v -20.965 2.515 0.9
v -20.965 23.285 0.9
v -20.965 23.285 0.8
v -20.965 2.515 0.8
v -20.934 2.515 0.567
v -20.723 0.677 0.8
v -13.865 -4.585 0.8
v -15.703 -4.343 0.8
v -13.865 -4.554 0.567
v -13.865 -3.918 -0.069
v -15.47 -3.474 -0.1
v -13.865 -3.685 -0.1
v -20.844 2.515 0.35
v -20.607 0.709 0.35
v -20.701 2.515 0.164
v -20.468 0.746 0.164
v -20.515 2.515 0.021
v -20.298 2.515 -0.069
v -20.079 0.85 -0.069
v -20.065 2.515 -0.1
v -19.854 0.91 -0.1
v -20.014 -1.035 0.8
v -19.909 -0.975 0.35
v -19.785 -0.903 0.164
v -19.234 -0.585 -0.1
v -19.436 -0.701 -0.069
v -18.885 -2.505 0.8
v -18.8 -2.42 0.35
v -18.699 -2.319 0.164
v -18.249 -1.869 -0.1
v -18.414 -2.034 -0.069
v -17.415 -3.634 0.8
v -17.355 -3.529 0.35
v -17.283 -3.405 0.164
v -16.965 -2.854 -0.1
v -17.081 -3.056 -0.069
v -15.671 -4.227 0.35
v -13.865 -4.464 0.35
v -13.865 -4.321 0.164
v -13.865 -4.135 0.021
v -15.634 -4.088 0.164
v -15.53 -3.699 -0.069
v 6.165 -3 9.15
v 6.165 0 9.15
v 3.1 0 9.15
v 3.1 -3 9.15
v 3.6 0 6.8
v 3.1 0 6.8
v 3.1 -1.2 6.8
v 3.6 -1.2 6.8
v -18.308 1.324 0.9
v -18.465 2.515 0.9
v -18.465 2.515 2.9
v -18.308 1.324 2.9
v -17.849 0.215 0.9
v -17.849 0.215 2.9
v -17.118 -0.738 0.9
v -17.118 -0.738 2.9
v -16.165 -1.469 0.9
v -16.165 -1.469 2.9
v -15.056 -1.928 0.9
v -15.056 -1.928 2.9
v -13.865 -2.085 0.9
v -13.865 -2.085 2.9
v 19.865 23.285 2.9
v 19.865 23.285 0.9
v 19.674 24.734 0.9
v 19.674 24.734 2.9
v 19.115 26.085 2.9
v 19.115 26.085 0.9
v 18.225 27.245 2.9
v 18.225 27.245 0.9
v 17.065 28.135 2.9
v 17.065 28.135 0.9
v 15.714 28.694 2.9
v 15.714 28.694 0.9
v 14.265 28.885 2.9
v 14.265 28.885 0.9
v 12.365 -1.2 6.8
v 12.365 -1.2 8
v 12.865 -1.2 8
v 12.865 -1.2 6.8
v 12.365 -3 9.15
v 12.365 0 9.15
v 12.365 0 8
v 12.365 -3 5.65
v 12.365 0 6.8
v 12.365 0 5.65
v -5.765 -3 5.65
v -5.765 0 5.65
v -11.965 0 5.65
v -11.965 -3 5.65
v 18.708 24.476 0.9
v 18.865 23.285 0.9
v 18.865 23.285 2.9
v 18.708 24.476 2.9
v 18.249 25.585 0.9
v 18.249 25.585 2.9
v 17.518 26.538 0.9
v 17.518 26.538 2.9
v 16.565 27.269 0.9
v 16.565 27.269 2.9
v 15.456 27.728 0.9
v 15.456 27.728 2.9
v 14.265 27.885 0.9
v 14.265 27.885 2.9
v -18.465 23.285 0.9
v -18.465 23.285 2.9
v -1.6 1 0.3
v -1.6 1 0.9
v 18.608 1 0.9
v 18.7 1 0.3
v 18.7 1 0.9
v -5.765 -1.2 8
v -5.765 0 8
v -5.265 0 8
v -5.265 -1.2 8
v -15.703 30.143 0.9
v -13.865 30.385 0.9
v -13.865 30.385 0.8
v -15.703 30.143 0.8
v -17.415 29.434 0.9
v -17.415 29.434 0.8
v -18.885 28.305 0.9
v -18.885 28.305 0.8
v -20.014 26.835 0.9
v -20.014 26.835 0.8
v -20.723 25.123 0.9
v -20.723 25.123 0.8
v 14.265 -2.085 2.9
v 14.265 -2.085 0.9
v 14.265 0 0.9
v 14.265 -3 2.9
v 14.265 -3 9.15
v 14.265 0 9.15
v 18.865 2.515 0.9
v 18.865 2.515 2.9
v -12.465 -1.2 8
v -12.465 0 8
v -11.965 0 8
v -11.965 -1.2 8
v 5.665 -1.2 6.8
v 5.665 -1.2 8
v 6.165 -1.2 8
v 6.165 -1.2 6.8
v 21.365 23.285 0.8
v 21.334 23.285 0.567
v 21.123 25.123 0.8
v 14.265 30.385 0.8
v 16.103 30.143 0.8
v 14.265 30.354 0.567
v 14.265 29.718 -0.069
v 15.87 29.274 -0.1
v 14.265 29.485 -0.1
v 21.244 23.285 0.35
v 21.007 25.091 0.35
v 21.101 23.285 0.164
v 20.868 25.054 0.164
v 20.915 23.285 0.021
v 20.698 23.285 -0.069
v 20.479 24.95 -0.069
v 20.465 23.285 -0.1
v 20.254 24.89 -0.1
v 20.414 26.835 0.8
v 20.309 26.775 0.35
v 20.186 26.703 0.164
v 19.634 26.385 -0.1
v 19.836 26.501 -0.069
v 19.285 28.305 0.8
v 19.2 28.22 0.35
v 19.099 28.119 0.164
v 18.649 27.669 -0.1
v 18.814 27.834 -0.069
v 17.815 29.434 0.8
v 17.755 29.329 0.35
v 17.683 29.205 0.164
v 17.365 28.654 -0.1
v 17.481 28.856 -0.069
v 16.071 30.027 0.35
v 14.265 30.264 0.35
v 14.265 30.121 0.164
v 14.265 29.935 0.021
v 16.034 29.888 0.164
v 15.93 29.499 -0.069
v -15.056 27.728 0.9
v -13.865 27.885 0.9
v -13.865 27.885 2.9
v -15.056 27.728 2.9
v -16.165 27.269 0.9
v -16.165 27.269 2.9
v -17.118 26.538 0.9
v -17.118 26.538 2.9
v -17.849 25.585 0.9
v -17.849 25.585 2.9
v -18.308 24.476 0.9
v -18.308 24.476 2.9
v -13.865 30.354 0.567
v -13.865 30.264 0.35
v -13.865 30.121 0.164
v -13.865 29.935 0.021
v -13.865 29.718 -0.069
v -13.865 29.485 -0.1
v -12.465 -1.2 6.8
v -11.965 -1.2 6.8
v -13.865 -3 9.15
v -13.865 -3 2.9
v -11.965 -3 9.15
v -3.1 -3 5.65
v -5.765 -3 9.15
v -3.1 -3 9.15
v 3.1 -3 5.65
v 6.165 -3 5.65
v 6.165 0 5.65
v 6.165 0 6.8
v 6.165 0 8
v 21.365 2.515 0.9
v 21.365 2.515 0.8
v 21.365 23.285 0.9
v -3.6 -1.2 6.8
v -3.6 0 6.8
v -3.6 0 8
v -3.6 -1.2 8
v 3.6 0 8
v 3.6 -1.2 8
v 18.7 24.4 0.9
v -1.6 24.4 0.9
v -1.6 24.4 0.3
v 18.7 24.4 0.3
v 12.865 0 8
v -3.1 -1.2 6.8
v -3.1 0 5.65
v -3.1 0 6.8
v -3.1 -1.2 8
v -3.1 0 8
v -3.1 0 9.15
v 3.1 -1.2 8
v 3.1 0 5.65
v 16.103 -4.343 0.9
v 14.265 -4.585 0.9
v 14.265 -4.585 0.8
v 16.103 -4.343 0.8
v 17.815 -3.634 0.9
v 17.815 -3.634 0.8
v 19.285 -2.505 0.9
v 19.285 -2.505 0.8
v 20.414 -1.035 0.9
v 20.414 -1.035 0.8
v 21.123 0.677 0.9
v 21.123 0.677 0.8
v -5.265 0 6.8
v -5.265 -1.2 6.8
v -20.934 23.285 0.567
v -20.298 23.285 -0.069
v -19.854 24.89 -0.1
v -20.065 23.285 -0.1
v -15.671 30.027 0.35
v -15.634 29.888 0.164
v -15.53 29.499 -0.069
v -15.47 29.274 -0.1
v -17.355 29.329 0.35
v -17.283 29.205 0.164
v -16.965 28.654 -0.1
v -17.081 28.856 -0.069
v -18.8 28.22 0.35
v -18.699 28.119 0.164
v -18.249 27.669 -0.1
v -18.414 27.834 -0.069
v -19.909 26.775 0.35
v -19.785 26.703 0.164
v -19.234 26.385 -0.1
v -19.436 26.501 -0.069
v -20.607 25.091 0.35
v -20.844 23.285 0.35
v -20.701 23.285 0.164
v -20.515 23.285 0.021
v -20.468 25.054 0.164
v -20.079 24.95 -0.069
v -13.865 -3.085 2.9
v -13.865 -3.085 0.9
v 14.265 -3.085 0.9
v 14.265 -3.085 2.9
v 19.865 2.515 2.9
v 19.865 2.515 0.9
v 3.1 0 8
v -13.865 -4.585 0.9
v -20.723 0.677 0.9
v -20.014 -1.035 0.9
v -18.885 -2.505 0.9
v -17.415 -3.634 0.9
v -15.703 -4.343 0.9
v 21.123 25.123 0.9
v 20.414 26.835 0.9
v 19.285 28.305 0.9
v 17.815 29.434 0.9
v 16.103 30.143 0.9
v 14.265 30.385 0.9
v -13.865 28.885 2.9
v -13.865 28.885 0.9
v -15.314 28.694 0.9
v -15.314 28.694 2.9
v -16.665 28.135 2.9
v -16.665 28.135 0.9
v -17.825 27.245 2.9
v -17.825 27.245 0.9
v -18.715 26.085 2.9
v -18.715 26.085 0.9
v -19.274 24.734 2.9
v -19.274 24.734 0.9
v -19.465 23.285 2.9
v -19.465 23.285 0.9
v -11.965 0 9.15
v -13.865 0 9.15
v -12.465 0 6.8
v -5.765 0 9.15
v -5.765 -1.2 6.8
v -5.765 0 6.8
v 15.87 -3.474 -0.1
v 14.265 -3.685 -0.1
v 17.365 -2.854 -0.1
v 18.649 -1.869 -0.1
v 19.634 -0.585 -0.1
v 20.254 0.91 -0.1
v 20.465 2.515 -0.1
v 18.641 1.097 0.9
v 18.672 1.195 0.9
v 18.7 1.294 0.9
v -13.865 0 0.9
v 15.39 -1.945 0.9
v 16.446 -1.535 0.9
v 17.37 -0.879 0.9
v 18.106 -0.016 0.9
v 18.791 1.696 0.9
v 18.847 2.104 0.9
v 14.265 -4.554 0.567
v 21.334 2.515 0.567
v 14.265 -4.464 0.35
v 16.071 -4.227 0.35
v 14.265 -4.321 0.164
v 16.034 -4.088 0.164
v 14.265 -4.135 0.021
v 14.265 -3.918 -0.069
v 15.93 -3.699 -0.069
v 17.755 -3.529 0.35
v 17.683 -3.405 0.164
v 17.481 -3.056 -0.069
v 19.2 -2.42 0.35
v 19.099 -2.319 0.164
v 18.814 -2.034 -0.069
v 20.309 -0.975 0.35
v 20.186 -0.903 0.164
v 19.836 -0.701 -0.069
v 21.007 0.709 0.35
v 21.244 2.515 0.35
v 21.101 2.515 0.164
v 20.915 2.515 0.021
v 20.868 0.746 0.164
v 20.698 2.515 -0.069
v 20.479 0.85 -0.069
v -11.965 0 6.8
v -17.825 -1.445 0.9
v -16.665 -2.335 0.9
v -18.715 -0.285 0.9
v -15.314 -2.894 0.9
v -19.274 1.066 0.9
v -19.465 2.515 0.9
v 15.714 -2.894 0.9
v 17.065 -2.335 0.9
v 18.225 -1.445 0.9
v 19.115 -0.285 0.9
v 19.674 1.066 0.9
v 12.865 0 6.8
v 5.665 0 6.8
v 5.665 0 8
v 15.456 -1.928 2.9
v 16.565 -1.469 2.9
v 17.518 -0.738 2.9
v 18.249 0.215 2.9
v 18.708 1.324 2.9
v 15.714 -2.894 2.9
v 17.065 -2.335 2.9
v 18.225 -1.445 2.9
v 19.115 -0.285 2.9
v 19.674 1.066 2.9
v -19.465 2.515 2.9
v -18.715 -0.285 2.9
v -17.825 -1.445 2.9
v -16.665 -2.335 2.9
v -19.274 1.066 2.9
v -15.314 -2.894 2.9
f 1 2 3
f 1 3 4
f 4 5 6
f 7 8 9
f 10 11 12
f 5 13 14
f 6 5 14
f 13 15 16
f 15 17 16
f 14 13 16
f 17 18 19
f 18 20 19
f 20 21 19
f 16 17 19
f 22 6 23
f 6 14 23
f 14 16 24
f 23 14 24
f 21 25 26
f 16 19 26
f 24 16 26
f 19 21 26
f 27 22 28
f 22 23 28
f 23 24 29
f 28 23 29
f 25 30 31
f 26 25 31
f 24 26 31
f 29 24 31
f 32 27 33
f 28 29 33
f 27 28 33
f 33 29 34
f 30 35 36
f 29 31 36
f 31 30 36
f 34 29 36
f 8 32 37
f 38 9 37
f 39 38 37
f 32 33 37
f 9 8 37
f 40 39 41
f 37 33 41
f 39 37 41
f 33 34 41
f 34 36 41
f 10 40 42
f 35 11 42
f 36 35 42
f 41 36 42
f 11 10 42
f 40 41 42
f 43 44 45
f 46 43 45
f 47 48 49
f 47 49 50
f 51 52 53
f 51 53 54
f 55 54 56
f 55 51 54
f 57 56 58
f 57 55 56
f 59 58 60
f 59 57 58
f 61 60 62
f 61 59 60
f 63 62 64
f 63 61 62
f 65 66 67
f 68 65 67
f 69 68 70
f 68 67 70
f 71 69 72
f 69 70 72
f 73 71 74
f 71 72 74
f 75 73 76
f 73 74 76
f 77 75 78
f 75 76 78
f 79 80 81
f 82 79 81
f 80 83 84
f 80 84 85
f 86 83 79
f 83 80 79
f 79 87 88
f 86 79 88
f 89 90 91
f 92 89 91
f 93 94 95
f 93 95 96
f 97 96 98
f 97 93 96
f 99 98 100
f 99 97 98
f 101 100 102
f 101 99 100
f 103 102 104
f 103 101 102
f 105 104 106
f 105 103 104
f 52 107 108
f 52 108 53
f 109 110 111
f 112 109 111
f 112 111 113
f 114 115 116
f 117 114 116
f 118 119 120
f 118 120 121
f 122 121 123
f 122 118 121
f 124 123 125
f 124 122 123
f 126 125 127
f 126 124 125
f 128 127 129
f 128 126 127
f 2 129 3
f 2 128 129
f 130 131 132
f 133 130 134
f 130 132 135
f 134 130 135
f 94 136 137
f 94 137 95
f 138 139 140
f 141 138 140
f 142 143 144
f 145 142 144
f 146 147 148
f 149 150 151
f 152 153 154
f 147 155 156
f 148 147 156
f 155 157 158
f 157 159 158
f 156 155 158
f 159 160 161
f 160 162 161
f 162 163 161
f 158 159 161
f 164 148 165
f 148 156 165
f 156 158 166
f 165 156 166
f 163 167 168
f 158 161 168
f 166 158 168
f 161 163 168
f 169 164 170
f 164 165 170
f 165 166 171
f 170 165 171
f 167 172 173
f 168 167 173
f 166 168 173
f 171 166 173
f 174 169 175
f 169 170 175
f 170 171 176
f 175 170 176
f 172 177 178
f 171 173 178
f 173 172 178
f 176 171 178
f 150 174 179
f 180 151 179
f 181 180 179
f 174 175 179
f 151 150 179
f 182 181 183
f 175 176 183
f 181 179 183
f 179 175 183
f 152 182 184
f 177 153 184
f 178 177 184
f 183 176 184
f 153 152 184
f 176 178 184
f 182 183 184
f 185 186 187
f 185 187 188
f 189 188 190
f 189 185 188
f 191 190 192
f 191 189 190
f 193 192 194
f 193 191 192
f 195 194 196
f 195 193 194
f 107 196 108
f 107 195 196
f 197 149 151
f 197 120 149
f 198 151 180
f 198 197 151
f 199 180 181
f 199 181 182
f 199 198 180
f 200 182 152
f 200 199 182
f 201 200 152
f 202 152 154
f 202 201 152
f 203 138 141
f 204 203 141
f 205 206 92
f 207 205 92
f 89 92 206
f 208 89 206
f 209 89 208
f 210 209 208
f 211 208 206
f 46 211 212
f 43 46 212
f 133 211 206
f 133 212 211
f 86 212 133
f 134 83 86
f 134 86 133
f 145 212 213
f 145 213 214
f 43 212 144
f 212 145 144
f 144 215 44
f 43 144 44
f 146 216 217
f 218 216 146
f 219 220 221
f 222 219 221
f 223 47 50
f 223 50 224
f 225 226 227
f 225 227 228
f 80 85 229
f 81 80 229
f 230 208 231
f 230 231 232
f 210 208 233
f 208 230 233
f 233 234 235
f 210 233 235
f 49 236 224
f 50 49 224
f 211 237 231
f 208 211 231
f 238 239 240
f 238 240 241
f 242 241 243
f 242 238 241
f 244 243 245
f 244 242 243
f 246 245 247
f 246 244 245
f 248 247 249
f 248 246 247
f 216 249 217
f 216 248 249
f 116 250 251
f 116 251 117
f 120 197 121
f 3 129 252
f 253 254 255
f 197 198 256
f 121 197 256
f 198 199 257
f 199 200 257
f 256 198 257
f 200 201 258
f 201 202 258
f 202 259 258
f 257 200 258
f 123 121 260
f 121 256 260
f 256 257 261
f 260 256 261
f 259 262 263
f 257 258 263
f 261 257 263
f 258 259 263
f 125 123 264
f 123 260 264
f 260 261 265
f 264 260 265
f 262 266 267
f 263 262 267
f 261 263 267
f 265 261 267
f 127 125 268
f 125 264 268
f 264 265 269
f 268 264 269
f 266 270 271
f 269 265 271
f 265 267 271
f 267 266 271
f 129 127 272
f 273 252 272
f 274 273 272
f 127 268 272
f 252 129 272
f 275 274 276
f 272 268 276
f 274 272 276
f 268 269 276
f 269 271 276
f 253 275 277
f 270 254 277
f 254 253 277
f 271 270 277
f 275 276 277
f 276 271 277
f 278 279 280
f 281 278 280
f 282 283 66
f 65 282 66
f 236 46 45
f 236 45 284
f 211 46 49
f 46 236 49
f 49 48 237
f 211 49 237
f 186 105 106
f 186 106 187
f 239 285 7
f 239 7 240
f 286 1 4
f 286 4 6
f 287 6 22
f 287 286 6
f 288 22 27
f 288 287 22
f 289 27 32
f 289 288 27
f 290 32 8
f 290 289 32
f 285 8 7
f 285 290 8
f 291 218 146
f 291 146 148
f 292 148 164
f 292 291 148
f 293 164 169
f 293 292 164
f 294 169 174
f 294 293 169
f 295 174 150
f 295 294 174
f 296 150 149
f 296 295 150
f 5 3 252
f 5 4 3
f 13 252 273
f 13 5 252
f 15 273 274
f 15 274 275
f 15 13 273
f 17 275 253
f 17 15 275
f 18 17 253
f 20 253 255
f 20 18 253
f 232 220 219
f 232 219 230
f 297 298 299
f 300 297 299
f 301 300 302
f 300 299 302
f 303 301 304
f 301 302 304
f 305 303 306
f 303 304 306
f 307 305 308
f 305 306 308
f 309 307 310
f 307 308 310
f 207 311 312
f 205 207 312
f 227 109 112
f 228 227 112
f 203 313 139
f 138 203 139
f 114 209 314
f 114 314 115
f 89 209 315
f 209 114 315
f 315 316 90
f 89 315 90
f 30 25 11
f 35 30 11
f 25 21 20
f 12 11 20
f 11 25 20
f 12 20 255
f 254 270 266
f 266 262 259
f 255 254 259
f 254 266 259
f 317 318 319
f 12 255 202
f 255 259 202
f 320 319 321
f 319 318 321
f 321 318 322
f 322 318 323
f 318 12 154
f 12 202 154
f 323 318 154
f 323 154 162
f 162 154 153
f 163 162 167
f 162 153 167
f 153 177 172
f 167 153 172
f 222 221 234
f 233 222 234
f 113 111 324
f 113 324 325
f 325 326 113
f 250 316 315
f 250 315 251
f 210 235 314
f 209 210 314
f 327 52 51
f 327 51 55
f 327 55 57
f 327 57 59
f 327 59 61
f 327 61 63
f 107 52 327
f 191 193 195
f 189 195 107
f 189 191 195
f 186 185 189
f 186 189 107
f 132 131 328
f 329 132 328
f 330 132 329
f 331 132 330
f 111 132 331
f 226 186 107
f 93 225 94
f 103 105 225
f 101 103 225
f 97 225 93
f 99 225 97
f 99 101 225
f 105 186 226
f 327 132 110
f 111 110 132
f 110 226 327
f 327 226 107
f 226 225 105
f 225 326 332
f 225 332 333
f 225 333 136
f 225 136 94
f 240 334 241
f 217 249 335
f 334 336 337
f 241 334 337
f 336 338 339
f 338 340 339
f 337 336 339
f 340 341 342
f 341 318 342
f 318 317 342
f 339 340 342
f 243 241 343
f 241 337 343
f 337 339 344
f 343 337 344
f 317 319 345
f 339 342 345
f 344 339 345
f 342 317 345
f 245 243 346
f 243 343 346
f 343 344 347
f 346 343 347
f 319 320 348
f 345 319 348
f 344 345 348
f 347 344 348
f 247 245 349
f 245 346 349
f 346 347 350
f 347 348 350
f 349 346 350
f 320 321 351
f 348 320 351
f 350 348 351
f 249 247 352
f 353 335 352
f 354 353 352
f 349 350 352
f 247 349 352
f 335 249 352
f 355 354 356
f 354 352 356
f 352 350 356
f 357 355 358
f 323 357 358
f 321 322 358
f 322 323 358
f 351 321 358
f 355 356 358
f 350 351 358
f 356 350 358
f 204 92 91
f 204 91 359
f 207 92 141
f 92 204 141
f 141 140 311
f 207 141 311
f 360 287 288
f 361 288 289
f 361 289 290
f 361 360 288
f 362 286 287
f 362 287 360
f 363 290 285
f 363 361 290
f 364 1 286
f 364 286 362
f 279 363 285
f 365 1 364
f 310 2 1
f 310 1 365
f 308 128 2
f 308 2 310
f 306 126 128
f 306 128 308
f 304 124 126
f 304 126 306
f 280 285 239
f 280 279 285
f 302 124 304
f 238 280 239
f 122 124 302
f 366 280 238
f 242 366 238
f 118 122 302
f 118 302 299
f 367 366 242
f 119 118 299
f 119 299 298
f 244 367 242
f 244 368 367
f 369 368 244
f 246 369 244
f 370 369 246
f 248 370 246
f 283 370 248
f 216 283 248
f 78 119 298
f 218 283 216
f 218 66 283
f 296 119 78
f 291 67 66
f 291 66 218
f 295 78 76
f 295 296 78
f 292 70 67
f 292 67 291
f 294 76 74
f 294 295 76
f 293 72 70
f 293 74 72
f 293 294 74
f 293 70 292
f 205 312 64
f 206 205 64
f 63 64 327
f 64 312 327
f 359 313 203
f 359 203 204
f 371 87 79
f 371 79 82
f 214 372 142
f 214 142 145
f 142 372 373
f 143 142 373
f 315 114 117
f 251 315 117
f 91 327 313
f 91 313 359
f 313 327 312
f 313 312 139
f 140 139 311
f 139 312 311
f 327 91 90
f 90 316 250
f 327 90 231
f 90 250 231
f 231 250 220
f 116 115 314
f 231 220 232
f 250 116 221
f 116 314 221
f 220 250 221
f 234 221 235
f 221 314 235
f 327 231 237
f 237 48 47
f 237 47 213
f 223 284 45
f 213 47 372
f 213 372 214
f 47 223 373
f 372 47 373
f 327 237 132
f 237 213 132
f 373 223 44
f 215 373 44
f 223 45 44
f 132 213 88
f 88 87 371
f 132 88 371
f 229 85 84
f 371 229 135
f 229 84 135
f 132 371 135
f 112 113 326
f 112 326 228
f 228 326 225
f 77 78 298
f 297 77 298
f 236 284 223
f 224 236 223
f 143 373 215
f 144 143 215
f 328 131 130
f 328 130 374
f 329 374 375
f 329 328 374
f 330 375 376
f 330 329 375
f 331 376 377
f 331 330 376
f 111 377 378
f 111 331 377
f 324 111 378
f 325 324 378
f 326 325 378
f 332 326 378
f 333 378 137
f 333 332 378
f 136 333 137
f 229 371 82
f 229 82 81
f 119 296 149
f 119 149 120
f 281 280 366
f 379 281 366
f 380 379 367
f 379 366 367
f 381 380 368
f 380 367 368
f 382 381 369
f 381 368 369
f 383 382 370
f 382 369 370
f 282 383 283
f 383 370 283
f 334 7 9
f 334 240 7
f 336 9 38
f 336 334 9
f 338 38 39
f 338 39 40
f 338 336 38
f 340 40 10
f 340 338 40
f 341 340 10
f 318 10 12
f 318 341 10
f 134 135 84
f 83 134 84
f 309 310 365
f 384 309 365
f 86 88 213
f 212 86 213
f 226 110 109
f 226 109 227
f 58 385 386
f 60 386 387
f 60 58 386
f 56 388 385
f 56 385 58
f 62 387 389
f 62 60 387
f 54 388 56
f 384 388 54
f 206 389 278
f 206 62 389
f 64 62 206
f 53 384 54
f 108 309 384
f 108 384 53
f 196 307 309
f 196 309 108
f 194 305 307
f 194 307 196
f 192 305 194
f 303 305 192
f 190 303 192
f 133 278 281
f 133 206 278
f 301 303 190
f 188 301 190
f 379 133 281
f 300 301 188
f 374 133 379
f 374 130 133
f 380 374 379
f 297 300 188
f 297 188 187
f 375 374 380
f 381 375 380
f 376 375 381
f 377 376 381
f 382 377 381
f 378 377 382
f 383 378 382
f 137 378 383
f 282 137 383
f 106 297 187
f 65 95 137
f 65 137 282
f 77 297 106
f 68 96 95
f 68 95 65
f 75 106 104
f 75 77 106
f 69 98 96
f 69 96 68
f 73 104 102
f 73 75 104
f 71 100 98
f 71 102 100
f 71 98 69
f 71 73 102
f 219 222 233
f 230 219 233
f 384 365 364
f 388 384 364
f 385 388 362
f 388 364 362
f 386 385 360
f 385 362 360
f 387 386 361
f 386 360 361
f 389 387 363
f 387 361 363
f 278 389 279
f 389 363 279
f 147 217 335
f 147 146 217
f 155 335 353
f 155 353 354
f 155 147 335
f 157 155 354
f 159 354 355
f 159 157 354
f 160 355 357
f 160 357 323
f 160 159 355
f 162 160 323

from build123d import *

# Parameters (mm, degrees)
PAD007_DEPTH    = 2
PAD008_DEPTH    = 1
SKETCH021_W     = 20.3
SKETCH021_H     = 23.4
POCKET008_DEPTH = 0.6
PAD009_DEPTH    = 3
SKETCH024_W     = 7.2
SKETCH024_H     = 1.2
POCKET010_DEPTH = 1.2
FILLET002_R     = 0.9


with BuildPart() as part:
    # Sketch019 → Pad007 (new body)
    with BuildSketch(Plane.XY):
        with BuildLine():
            Line((-13.864971, -3.085), (14.264998, -3.085))
            ThreePointArc((14.264998, -3.085), (18.224807, -1.444793), (19.865014, 2.515016))
            Line((19.865014, 2.515016), (19.865014, 23.284984))
            ThreePointArc((19.865014, 23.284984), (18.224807, 27.244793), (14.264998, 28.885))
            Line((14.264998, 28.885), (-13.864971, 28.885))
            ThreePointArc((-13.864971, 28.885), (-17.82478, 27.244793), (-19.464986, 23.284984))
            Line((-19.464986, 23.284984), (-19.464986, 2.515016))
            ThreePointArc((-19.464986, 2.515016), (-17.82478, -1.444793), (-13.864971, -3.085))
        make_face()
        with BuildLine():
            Line((-18.464986, 23.284984), (-18.464986, 2.515016))
            ThreePointArc((-18.464986, 2.515016), (-17.117673, -0.737687), (-13.864971, -2.085))
            Line((-13.864971, -2.085), (14.264998, -2.085))
            ThreePointArc((14.264998, -2.085), (17.5177, -0.737687), (18.865014, 2.515016))
            Line((18.865014, 2.515016), (18.865014, 23.284984))
            ThreePointArc((18.865014, 23.284984), (17.5177, 26.537687), (14.264998, 27.885))
            Line((14.264998, 27.885), (-13.864971, 27.885))
            ThreePointArc((-13.864971, 27.885), (-17.117673, 26.537687), (-18.464986, 23.284984))
        make_face(mode=Mode.SUBTRACT)
    extrude(amount=PAD007_DEPTH)

    # Sketch020 → Pad008 (join)
    with BuildSketch(Plane.XY):
        with BuildLine():
            Line((-20.964986, 23.284984), (-20.964986, 2.515016))
            ThreePointArc((-20.964986, 2.515016), (-18.88544, -2.505454), (-13.864971, -4.585))
            Line((-13.864971, -4.585), (14.264998, -4.585))
            ThreePointArc((14.264998, -4.585), (19.285467, -2.505454), (21.365014, 2.515016))
            Line((21.365014, 2.515016), (21.365014, 23.284984))
            ThreePointArc((21.365014, 23.284984), (19.285467, 28.305454), (14.264998, 30.385))
            Line((14.264998, 30.385), (-13.864971, 30.385))
            ThreePointArc((-13.864971, 30.385), (-18.88544, 28.305454), (-20.964986, 23.284984))
        make_face()
    extrude(amount=-PAD008_DEPTH)

    # Sketch021 → Pocket008 (cut)
    with BuildSketch(Plane.XY):
        with Locations((8.55, 12.7)):
            Rectangle(SKETCH021_W, SKETCH021_H)
    extrude(amount=-POCKET008_DEPTH, mode=Mode.SUBTRACT)

    # Sketch023 → Pad009 (join)
    with BuildSketch(Plane.XZ):
        Polygon((-13.864971, 0), (14.264998, 0), (14.264998, 8.25), (12.364998, 8.25), (12.364998, 4.75), (6.164998, 4.75), (6.164998, 8.25), (3.1, 8.25), (3.1, 4.75), (-3.1, 4.75), (-3.1, 8.25), (-5.764971, 8.25), (-5.764971, 4.75), (-11.964971, 4.75), (-11.964971, 8.25), (-13.864971, 8.25), align=None)
    extrude(amount=PAD009_DEPTH)

    # Sketch024 → Pocket010 (cut)
    with BuildSketch(Plane.XZ):
        with Locations((-8.864971, 6.5)):
            Rectangle(SKETCH024_W, SKETCH024_H)
        with Locations((0, 6.5)):
            Rectangle(SKETCH024_W, SKETCH024_H)
        with Locations((9.264998, 6.5)):
            Rectangle(SKETCH024_W, SKETCH024_H)
    extrude(amount=POCKET010_DEPTH, mode=Mode.SUBTRACT)

    # Fillet002
    fillet002_edges = [part.edges().sort_by_distance(p)[0] for p in [
        (-20.964986, 12.9, -1),
        (-18.88544, 28.305454, -1),
        (0.200014, 30.385, -1),
        (19.285467, 28.305454, -1),
        (21.365014, 12.9, -1),
        (19.285467, -2.505454, -1),
        (0.200014, -4.585, -1),
        (-18.88544, -2.505454, -1),
    ]]
    fillet(fillet002_edges, radius=FILLET002_R)


with BuildPart() as part_1:
    # Body004 placement: moved
    add(part.part.moved(Location((0, 0, 0.9))))


solid = part_1.part
